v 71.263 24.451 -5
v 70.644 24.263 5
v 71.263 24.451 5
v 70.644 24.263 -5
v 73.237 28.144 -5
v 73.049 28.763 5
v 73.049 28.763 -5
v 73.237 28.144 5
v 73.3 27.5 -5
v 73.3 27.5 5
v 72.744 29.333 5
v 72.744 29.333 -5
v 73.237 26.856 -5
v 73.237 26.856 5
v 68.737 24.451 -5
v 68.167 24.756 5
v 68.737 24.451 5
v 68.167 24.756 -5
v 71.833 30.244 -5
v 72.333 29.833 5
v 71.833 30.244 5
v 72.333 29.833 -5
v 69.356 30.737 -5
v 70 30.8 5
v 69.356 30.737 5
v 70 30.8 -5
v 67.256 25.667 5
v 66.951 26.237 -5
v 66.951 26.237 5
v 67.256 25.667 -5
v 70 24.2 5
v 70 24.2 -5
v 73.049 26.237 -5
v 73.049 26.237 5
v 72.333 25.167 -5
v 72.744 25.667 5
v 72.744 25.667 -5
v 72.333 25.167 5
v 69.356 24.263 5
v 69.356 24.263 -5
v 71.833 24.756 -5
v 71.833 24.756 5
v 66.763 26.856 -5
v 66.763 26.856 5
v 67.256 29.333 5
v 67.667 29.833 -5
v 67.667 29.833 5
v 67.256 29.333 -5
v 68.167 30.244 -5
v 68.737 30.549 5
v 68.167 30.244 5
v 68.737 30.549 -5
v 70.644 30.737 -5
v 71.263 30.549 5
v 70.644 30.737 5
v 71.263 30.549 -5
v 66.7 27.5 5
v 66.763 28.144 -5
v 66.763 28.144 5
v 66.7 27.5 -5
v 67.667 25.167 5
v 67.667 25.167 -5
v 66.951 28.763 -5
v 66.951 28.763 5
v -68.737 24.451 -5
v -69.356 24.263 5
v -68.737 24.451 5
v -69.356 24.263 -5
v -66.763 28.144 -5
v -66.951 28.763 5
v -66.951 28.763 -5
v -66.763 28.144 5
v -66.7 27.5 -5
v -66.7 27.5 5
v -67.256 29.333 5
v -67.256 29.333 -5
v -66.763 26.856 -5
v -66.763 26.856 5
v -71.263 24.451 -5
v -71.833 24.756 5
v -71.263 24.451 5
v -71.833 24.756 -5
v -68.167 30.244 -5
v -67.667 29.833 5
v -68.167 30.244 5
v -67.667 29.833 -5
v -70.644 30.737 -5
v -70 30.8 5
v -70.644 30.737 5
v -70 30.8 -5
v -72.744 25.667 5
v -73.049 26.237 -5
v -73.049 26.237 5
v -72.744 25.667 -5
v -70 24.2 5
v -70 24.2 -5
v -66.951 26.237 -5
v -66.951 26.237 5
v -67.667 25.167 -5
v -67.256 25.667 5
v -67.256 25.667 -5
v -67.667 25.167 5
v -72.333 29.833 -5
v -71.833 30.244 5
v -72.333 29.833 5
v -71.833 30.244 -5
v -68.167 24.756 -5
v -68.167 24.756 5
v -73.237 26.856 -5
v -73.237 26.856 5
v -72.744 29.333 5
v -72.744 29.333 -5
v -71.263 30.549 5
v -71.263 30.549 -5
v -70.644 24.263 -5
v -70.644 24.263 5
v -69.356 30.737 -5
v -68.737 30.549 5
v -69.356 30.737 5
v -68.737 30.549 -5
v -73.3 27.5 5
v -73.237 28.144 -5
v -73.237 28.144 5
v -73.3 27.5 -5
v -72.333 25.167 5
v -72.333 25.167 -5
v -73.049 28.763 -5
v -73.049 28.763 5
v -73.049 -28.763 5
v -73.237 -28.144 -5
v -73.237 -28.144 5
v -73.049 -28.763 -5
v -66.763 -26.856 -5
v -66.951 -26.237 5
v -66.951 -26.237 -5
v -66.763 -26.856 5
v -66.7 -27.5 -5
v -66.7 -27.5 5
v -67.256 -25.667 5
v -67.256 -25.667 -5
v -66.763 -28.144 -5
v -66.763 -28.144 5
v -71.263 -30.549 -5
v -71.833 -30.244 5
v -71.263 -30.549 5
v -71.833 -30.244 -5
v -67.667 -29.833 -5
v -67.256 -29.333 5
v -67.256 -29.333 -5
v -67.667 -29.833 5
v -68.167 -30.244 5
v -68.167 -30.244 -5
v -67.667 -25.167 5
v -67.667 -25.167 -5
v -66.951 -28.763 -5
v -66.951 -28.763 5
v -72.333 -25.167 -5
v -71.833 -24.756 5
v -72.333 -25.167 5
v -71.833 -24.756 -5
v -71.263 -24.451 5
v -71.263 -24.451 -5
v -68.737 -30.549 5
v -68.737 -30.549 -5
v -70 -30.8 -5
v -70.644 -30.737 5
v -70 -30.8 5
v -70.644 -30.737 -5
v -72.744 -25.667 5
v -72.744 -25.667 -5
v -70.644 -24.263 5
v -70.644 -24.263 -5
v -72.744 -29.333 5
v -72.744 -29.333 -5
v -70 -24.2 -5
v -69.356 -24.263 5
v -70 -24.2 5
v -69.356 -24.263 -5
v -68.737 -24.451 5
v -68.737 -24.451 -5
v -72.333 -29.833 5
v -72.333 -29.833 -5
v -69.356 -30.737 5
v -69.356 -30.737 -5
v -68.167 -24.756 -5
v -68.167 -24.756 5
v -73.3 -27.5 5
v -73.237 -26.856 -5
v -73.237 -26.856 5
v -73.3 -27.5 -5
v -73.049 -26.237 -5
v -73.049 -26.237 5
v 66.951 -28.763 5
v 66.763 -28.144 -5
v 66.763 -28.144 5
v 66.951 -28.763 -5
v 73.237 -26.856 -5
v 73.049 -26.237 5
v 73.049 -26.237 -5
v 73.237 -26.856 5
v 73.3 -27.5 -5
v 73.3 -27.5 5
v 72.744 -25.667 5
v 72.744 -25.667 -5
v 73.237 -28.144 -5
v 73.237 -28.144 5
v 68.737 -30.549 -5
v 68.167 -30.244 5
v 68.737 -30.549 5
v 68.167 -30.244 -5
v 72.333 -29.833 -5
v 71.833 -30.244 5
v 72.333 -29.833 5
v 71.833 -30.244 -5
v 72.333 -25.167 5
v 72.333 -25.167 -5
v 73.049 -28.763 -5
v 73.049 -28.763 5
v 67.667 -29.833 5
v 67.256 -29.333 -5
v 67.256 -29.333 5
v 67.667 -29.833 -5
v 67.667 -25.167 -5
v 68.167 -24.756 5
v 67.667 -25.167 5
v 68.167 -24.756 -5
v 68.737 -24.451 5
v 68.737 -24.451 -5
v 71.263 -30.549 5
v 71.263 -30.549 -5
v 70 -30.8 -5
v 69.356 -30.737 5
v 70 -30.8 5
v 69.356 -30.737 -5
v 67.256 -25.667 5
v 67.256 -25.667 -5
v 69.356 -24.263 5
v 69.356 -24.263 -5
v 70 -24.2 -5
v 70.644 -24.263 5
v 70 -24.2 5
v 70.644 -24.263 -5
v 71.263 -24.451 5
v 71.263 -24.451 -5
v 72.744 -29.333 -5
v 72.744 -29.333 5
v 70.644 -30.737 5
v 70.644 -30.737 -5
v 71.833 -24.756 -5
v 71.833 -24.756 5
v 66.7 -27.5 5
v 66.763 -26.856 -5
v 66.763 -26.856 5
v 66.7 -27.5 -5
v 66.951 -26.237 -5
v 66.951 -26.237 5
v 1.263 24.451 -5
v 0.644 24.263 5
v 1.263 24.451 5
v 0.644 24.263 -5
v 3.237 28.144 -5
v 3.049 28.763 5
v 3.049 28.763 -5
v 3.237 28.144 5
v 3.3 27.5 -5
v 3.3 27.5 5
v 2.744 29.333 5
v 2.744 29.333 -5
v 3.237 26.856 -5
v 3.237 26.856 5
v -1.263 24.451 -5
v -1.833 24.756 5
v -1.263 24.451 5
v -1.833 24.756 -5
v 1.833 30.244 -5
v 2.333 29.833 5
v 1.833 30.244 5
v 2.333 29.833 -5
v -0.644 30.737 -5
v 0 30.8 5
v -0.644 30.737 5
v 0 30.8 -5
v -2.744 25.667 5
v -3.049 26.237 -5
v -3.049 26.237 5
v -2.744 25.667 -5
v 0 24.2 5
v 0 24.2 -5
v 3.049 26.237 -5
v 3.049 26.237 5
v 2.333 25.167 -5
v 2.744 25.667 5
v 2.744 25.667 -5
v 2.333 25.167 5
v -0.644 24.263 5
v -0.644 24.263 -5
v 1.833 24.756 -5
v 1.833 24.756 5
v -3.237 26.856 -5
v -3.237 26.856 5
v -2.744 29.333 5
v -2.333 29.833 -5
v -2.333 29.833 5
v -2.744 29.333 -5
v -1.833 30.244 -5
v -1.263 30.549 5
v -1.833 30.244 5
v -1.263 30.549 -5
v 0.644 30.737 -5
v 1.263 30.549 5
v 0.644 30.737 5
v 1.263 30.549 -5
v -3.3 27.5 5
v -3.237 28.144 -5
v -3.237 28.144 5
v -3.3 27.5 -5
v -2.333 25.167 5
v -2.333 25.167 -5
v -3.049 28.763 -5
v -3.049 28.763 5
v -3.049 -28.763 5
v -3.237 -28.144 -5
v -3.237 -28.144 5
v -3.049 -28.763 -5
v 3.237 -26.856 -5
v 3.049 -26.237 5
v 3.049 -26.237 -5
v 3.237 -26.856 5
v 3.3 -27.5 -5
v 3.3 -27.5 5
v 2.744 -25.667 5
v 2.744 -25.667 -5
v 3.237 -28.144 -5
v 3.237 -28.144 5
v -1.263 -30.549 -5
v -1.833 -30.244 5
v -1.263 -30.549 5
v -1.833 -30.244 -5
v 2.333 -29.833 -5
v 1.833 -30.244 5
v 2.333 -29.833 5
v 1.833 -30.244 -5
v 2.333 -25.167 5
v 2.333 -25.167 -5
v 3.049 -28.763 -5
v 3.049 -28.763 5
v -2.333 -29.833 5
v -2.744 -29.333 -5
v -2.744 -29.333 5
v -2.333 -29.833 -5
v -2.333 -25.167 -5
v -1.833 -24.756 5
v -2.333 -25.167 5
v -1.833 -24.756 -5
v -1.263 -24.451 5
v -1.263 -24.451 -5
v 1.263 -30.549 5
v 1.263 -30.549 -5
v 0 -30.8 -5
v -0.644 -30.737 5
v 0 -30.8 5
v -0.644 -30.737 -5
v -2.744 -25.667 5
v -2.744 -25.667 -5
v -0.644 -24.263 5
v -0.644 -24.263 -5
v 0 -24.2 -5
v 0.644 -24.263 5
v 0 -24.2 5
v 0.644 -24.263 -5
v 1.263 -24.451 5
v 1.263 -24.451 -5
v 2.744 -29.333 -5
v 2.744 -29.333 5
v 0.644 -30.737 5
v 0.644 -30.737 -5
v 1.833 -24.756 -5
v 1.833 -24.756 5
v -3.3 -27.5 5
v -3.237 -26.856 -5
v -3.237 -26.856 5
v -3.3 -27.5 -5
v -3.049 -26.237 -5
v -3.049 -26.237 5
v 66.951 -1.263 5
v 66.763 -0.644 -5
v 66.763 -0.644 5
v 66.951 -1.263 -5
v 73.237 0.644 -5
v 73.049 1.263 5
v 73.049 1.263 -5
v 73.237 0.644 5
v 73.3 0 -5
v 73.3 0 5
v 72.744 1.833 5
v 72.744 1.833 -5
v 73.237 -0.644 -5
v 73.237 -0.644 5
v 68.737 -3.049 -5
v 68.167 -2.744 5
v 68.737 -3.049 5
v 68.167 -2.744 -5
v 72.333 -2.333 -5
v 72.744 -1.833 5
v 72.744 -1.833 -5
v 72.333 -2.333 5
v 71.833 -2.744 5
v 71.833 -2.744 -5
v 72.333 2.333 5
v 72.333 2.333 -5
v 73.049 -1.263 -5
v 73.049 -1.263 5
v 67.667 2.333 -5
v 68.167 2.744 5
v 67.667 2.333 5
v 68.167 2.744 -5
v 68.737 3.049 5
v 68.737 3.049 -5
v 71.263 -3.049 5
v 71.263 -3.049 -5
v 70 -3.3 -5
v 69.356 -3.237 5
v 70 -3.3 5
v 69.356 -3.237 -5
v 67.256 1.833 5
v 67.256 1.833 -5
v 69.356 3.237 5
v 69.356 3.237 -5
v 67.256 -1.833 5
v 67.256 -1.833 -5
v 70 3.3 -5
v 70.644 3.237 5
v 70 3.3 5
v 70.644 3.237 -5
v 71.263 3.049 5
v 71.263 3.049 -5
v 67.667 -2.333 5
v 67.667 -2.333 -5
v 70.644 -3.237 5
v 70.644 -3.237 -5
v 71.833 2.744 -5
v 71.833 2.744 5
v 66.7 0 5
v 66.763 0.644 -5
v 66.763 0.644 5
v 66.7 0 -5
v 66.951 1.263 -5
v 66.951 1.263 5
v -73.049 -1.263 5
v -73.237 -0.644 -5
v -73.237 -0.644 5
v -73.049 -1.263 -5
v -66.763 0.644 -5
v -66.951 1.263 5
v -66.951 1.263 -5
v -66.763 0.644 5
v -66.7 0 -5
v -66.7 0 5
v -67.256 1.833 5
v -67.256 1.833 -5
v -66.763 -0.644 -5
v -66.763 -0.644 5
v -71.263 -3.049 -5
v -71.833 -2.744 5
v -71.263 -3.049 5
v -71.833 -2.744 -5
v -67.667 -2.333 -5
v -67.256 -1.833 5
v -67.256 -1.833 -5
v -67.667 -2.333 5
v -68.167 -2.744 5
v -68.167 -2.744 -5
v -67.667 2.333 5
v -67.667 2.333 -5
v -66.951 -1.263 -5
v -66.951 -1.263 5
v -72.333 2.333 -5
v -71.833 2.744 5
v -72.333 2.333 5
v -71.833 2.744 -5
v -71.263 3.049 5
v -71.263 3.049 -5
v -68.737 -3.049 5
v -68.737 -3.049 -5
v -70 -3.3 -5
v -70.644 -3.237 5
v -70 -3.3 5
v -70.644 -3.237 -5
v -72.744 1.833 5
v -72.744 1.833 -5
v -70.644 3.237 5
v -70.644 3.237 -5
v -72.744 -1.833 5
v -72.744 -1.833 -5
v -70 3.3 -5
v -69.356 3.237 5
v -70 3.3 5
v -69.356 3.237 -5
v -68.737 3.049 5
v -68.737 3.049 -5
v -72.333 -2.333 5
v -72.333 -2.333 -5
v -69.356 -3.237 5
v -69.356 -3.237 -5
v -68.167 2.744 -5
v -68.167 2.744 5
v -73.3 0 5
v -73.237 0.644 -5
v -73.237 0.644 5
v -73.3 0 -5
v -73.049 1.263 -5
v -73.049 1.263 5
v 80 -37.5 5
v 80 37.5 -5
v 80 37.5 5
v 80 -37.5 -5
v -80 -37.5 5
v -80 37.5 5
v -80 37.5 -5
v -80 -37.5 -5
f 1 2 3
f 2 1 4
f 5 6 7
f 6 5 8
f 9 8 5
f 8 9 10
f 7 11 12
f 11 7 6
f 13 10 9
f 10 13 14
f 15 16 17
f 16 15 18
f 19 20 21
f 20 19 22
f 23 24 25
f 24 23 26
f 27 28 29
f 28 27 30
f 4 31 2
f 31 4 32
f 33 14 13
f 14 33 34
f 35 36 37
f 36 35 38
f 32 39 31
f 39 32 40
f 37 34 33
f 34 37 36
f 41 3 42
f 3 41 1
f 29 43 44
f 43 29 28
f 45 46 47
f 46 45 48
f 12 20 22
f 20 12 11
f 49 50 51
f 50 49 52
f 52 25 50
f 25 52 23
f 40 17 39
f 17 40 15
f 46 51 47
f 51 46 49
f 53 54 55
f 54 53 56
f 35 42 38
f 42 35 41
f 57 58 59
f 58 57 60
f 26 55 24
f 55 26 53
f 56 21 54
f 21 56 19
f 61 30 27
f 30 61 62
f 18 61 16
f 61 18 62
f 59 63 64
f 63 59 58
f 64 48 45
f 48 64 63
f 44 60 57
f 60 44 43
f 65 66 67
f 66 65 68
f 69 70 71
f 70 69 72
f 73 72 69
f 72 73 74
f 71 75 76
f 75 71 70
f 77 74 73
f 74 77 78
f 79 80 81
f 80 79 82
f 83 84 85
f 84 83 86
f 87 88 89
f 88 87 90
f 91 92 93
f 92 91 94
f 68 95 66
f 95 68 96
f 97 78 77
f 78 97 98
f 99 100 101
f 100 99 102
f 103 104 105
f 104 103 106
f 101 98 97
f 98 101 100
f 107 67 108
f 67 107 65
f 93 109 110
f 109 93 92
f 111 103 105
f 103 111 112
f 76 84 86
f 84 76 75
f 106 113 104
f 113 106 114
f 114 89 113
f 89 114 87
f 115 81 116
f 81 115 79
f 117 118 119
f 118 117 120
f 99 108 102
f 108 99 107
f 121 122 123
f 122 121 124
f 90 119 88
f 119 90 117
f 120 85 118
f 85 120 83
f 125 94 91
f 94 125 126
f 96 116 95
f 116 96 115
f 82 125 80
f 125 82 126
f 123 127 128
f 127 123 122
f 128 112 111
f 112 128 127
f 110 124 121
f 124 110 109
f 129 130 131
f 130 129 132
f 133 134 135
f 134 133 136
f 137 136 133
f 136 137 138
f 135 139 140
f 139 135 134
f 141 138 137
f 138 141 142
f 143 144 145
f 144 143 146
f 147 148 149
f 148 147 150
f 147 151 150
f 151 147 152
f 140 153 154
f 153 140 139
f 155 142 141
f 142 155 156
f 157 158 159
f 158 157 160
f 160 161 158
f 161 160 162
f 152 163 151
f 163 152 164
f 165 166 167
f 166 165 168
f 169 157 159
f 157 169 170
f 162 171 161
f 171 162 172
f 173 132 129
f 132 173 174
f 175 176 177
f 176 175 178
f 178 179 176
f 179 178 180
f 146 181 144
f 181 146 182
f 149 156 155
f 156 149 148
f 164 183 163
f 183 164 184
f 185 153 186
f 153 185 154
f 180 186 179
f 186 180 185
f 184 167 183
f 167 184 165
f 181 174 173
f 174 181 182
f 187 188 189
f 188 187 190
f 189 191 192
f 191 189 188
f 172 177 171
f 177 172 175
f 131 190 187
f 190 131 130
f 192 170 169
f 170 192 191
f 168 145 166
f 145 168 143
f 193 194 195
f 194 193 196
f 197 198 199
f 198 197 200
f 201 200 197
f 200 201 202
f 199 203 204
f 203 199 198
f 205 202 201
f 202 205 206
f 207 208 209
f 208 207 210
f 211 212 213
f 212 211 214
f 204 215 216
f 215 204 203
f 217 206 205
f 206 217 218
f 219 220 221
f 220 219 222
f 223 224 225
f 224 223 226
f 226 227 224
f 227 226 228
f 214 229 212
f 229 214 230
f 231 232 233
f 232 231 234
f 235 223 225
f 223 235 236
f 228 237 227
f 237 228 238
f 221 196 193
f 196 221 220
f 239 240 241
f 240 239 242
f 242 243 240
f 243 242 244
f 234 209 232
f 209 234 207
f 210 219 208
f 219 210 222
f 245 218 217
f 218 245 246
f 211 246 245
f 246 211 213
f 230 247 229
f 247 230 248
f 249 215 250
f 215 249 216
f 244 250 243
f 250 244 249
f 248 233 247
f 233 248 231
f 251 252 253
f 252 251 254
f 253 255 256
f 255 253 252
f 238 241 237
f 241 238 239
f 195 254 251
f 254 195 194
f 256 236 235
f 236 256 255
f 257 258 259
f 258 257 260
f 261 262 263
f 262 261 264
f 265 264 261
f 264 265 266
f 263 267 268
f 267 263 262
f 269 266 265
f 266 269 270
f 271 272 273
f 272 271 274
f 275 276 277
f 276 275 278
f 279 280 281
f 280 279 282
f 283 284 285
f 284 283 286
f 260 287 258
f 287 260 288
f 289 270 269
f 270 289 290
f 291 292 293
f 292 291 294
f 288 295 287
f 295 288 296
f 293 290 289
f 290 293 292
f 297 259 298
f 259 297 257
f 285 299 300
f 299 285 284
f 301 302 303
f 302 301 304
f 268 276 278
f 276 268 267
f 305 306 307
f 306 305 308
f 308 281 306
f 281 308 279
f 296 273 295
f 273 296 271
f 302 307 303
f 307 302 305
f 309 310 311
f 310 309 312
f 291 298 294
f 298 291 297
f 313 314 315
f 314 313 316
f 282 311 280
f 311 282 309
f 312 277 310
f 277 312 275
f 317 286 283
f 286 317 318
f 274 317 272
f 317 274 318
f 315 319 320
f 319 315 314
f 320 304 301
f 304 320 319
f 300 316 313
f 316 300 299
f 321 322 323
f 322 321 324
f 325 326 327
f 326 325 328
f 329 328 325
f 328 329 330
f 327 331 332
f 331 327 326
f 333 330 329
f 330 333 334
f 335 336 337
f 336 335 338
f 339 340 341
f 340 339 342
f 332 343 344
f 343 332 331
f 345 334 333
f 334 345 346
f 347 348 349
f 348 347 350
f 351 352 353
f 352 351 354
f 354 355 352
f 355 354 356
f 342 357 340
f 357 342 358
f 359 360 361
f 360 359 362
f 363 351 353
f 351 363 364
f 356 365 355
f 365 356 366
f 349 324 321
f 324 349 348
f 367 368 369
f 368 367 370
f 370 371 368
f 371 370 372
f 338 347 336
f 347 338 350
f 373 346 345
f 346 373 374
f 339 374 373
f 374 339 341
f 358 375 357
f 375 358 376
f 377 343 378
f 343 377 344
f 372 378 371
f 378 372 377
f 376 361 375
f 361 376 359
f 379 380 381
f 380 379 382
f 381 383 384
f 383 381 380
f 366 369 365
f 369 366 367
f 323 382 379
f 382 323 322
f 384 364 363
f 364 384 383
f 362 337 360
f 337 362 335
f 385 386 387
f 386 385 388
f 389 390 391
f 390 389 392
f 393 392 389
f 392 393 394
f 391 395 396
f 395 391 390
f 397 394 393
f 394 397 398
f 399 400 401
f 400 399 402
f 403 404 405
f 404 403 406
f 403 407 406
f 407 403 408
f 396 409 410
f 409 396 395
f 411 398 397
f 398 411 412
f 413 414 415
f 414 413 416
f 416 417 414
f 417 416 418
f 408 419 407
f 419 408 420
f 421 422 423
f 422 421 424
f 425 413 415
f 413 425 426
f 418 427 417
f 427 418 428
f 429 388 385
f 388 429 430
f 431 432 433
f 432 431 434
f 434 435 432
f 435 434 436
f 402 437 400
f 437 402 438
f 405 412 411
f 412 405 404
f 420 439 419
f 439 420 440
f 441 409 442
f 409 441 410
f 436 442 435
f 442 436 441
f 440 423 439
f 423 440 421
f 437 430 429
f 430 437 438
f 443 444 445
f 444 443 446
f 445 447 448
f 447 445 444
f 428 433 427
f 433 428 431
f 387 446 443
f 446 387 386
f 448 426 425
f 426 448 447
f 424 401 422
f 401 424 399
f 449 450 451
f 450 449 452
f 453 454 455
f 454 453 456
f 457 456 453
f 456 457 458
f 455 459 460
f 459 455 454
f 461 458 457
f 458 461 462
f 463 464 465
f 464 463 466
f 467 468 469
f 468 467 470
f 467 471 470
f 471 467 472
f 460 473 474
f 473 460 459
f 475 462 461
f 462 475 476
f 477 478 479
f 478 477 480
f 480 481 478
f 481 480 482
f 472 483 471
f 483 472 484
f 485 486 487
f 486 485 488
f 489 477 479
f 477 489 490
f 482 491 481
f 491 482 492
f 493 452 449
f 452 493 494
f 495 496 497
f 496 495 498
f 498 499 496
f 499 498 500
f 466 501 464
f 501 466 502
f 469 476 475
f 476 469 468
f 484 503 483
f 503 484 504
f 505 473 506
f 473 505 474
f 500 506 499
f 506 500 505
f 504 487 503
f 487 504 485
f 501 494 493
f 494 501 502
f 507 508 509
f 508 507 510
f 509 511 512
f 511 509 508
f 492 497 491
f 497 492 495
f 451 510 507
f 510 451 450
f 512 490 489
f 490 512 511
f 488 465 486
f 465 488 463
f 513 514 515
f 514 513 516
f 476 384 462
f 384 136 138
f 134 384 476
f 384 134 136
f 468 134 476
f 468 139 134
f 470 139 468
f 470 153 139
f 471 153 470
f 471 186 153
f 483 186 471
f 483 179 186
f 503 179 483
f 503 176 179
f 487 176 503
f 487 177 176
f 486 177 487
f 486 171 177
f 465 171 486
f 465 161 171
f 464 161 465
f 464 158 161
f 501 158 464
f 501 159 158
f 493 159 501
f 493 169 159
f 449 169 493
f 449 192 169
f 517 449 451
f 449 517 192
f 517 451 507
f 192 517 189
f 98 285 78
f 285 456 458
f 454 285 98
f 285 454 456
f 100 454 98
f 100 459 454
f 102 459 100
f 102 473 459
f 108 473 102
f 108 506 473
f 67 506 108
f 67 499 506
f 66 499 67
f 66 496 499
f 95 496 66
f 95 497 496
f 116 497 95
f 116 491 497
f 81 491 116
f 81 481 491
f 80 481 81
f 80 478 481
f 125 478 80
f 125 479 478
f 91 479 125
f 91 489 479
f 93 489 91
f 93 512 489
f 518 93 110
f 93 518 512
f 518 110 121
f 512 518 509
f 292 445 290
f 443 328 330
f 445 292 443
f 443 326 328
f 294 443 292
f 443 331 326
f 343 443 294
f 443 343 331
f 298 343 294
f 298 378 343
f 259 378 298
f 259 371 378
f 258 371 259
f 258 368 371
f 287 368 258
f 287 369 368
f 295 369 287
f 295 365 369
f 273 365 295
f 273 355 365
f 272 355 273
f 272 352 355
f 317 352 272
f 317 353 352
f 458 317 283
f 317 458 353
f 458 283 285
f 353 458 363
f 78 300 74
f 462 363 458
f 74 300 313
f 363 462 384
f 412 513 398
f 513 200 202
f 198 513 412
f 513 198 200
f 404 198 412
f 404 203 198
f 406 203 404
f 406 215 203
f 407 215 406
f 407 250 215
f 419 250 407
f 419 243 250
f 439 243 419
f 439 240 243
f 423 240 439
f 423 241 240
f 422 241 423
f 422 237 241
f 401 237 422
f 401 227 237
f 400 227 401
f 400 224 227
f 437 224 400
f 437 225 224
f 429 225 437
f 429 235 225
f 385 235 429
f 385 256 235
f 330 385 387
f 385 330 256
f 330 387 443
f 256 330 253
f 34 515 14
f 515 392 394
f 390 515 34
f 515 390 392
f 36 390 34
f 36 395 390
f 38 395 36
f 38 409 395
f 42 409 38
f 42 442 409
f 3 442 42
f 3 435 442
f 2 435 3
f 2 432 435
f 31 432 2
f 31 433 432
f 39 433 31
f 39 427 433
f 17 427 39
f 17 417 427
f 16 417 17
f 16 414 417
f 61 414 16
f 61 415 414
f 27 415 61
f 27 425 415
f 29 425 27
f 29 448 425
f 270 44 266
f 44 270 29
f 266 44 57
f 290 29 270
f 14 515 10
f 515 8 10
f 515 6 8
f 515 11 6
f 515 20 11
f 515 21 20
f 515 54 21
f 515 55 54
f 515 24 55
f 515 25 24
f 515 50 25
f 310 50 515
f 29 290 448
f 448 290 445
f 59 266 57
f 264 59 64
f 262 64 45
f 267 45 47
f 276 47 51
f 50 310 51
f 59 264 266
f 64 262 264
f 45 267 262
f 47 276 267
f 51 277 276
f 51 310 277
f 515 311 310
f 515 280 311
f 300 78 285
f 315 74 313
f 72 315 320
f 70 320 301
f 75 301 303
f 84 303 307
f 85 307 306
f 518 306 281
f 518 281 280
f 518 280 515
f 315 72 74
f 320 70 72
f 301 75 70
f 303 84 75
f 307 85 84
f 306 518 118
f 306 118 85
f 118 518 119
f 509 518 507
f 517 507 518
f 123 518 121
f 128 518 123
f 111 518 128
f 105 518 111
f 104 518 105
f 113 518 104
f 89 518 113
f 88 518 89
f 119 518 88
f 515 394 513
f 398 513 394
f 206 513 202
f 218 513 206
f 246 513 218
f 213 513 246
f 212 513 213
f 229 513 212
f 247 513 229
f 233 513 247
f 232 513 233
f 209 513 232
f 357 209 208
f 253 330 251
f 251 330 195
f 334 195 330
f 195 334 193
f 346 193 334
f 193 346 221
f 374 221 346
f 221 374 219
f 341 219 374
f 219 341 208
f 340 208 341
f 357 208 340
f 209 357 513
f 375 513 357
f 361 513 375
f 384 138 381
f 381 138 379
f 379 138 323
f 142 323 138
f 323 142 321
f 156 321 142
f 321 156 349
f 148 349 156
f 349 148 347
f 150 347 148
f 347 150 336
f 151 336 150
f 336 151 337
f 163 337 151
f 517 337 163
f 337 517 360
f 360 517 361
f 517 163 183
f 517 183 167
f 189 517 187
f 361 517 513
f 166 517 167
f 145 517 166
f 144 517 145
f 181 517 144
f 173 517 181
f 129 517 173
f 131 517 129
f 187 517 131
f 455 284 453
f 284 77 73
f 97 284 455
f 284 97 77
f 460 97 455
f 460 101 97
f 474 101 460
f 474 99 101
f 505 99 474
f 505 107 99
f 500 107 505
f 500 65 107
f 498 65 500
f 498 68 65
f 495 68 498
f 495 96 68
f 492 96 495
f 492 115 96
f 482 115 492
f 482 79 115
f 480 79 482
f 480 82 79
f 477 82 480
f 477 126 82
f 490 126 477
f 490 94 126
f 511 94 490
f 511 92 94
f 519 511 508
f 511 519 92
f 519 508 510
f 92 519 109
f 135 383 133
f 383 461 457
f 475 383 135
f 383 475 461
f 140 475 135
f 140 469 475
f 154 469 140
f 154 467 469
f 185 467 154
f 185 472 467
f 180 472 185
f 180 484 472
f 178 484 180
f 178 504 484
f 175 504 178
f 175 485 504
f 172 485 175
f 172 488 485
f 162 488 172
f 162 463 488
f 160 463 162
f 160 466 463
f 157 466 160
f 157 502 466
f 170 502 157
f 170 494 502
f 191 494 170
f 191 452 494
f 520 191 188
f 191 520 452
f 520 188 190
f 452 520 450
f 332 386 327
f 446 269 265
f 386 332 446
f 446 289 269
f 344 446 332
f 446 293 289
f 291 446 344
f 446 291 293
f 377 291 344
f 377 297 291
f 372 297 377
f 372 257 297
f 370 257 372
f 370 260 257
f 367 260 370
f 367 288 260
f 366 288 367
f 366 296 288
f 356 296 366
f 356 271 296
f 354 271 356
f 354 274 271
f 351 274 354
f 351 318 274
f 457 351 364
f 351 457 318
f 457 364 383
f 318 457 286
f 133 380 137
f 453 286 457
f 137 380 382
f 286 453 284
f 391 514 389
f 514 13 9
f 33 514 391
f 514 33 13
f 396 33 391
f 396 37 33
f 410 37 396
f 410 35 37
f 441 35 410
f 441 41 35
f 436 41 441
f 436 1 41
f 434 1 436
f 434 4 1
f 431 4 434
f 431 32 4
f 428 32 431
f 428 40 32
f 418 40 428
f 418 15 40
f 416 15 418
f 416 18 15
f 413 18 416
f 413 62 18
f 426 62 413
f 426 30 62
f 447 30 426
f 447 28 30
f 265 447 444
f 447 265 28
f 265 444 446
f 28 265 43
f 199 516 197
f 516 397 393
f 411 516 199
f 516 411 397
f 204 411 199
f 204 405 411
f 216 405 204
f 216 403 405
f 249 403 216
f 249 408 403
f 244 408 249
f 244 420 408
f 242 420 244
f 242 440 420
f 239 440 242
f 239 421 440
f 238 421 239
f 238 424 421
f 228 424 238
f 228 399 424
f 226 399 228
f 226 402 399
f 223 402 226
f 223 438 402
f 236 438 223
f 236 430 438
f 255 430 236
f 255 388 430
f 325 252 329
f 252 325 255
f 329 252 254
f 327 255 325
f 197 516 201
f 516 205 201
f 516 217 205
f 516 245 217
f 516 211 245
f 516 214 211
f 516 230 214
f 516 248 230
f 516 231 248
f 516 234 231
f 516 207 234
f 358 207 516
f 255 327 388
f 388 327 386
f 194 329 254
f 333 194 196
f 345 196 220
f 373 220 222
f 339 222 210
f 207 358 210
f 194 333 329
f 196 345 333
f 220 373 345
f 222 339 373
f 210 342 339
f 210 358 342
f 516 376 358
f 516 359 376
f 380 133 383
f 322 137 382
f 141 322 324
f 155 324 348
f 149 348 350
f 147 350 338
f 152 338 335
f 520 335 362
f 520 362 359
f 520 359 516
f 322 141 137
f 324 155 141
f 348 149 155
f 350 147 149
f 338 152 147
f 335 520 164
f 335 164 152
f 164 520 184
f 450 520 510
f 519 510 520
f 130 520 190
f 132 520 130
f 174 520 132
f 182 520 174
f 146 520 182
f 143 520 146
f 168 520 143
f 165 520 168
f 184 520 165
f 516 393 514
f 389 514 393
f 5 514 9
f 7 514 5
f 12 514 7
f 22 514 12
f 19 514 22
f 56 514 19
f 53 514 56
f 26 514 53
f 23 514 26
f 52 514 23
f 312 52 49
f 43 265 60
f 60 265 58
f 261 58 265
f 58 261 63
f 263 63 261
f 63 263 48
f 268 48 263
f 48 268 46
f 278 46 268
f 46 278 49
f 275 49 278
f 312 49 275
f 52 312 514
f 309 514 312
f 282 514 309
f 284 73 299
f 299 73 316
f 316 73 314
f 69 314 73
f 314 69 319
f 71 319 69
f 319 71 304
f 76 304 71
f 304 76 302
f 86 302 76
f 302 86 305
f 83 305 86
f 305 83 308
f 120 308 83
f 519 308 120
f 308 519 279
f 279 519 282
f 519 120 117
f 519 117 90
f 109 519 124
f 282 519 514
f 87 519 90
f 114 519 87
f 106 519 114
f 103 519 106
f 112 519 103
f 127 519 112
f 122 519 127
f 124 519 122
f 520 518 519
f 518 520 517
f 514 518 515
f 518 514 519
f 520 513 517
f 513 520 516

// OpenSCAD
$fn = 32;

// ----------------------------------------------------------------------
// Corner plate 160 x 75 x 10
// 8 holes, centres taken from the edge offset
// ----------------------------------------------------------------------

// --- parameters (mm) ---
plate = [160, 75, 10];  // overall size (x, y, z)
holes = 8;              // number of holes the drawing asks for
hole_d = 6.6;           // hole diameter
edge = 10;              // hole centre offset from the plate edge

// --- derived feature positions (mm) ---
corner_x = plate[0] / 2 - edge;  // = 70   corner hole X
corner_y = plate[1] / 2 - edge;  // = 27.5   corner hole Y
feature_centers = [
  [corner_x, corner_y],
  [-corner_x, corner_y],
  [-corner_x, -corner_y],
  [corner_x, -corner_y],
  [0, corner_y],
  [0, -corner_y],
  [corner_x, 0],
  [-corner_x, 0]
];   // hole centres the loop below drills

// plate outline, every hole drilled through with the same cutters
difference() {
  cube(plate, center = true);
  for (centre = feature_centers)
    translate([centre[0], centre[1], 0])
      cylinder(d = hole_d, h = plate[2] + 2, center = true);
}
